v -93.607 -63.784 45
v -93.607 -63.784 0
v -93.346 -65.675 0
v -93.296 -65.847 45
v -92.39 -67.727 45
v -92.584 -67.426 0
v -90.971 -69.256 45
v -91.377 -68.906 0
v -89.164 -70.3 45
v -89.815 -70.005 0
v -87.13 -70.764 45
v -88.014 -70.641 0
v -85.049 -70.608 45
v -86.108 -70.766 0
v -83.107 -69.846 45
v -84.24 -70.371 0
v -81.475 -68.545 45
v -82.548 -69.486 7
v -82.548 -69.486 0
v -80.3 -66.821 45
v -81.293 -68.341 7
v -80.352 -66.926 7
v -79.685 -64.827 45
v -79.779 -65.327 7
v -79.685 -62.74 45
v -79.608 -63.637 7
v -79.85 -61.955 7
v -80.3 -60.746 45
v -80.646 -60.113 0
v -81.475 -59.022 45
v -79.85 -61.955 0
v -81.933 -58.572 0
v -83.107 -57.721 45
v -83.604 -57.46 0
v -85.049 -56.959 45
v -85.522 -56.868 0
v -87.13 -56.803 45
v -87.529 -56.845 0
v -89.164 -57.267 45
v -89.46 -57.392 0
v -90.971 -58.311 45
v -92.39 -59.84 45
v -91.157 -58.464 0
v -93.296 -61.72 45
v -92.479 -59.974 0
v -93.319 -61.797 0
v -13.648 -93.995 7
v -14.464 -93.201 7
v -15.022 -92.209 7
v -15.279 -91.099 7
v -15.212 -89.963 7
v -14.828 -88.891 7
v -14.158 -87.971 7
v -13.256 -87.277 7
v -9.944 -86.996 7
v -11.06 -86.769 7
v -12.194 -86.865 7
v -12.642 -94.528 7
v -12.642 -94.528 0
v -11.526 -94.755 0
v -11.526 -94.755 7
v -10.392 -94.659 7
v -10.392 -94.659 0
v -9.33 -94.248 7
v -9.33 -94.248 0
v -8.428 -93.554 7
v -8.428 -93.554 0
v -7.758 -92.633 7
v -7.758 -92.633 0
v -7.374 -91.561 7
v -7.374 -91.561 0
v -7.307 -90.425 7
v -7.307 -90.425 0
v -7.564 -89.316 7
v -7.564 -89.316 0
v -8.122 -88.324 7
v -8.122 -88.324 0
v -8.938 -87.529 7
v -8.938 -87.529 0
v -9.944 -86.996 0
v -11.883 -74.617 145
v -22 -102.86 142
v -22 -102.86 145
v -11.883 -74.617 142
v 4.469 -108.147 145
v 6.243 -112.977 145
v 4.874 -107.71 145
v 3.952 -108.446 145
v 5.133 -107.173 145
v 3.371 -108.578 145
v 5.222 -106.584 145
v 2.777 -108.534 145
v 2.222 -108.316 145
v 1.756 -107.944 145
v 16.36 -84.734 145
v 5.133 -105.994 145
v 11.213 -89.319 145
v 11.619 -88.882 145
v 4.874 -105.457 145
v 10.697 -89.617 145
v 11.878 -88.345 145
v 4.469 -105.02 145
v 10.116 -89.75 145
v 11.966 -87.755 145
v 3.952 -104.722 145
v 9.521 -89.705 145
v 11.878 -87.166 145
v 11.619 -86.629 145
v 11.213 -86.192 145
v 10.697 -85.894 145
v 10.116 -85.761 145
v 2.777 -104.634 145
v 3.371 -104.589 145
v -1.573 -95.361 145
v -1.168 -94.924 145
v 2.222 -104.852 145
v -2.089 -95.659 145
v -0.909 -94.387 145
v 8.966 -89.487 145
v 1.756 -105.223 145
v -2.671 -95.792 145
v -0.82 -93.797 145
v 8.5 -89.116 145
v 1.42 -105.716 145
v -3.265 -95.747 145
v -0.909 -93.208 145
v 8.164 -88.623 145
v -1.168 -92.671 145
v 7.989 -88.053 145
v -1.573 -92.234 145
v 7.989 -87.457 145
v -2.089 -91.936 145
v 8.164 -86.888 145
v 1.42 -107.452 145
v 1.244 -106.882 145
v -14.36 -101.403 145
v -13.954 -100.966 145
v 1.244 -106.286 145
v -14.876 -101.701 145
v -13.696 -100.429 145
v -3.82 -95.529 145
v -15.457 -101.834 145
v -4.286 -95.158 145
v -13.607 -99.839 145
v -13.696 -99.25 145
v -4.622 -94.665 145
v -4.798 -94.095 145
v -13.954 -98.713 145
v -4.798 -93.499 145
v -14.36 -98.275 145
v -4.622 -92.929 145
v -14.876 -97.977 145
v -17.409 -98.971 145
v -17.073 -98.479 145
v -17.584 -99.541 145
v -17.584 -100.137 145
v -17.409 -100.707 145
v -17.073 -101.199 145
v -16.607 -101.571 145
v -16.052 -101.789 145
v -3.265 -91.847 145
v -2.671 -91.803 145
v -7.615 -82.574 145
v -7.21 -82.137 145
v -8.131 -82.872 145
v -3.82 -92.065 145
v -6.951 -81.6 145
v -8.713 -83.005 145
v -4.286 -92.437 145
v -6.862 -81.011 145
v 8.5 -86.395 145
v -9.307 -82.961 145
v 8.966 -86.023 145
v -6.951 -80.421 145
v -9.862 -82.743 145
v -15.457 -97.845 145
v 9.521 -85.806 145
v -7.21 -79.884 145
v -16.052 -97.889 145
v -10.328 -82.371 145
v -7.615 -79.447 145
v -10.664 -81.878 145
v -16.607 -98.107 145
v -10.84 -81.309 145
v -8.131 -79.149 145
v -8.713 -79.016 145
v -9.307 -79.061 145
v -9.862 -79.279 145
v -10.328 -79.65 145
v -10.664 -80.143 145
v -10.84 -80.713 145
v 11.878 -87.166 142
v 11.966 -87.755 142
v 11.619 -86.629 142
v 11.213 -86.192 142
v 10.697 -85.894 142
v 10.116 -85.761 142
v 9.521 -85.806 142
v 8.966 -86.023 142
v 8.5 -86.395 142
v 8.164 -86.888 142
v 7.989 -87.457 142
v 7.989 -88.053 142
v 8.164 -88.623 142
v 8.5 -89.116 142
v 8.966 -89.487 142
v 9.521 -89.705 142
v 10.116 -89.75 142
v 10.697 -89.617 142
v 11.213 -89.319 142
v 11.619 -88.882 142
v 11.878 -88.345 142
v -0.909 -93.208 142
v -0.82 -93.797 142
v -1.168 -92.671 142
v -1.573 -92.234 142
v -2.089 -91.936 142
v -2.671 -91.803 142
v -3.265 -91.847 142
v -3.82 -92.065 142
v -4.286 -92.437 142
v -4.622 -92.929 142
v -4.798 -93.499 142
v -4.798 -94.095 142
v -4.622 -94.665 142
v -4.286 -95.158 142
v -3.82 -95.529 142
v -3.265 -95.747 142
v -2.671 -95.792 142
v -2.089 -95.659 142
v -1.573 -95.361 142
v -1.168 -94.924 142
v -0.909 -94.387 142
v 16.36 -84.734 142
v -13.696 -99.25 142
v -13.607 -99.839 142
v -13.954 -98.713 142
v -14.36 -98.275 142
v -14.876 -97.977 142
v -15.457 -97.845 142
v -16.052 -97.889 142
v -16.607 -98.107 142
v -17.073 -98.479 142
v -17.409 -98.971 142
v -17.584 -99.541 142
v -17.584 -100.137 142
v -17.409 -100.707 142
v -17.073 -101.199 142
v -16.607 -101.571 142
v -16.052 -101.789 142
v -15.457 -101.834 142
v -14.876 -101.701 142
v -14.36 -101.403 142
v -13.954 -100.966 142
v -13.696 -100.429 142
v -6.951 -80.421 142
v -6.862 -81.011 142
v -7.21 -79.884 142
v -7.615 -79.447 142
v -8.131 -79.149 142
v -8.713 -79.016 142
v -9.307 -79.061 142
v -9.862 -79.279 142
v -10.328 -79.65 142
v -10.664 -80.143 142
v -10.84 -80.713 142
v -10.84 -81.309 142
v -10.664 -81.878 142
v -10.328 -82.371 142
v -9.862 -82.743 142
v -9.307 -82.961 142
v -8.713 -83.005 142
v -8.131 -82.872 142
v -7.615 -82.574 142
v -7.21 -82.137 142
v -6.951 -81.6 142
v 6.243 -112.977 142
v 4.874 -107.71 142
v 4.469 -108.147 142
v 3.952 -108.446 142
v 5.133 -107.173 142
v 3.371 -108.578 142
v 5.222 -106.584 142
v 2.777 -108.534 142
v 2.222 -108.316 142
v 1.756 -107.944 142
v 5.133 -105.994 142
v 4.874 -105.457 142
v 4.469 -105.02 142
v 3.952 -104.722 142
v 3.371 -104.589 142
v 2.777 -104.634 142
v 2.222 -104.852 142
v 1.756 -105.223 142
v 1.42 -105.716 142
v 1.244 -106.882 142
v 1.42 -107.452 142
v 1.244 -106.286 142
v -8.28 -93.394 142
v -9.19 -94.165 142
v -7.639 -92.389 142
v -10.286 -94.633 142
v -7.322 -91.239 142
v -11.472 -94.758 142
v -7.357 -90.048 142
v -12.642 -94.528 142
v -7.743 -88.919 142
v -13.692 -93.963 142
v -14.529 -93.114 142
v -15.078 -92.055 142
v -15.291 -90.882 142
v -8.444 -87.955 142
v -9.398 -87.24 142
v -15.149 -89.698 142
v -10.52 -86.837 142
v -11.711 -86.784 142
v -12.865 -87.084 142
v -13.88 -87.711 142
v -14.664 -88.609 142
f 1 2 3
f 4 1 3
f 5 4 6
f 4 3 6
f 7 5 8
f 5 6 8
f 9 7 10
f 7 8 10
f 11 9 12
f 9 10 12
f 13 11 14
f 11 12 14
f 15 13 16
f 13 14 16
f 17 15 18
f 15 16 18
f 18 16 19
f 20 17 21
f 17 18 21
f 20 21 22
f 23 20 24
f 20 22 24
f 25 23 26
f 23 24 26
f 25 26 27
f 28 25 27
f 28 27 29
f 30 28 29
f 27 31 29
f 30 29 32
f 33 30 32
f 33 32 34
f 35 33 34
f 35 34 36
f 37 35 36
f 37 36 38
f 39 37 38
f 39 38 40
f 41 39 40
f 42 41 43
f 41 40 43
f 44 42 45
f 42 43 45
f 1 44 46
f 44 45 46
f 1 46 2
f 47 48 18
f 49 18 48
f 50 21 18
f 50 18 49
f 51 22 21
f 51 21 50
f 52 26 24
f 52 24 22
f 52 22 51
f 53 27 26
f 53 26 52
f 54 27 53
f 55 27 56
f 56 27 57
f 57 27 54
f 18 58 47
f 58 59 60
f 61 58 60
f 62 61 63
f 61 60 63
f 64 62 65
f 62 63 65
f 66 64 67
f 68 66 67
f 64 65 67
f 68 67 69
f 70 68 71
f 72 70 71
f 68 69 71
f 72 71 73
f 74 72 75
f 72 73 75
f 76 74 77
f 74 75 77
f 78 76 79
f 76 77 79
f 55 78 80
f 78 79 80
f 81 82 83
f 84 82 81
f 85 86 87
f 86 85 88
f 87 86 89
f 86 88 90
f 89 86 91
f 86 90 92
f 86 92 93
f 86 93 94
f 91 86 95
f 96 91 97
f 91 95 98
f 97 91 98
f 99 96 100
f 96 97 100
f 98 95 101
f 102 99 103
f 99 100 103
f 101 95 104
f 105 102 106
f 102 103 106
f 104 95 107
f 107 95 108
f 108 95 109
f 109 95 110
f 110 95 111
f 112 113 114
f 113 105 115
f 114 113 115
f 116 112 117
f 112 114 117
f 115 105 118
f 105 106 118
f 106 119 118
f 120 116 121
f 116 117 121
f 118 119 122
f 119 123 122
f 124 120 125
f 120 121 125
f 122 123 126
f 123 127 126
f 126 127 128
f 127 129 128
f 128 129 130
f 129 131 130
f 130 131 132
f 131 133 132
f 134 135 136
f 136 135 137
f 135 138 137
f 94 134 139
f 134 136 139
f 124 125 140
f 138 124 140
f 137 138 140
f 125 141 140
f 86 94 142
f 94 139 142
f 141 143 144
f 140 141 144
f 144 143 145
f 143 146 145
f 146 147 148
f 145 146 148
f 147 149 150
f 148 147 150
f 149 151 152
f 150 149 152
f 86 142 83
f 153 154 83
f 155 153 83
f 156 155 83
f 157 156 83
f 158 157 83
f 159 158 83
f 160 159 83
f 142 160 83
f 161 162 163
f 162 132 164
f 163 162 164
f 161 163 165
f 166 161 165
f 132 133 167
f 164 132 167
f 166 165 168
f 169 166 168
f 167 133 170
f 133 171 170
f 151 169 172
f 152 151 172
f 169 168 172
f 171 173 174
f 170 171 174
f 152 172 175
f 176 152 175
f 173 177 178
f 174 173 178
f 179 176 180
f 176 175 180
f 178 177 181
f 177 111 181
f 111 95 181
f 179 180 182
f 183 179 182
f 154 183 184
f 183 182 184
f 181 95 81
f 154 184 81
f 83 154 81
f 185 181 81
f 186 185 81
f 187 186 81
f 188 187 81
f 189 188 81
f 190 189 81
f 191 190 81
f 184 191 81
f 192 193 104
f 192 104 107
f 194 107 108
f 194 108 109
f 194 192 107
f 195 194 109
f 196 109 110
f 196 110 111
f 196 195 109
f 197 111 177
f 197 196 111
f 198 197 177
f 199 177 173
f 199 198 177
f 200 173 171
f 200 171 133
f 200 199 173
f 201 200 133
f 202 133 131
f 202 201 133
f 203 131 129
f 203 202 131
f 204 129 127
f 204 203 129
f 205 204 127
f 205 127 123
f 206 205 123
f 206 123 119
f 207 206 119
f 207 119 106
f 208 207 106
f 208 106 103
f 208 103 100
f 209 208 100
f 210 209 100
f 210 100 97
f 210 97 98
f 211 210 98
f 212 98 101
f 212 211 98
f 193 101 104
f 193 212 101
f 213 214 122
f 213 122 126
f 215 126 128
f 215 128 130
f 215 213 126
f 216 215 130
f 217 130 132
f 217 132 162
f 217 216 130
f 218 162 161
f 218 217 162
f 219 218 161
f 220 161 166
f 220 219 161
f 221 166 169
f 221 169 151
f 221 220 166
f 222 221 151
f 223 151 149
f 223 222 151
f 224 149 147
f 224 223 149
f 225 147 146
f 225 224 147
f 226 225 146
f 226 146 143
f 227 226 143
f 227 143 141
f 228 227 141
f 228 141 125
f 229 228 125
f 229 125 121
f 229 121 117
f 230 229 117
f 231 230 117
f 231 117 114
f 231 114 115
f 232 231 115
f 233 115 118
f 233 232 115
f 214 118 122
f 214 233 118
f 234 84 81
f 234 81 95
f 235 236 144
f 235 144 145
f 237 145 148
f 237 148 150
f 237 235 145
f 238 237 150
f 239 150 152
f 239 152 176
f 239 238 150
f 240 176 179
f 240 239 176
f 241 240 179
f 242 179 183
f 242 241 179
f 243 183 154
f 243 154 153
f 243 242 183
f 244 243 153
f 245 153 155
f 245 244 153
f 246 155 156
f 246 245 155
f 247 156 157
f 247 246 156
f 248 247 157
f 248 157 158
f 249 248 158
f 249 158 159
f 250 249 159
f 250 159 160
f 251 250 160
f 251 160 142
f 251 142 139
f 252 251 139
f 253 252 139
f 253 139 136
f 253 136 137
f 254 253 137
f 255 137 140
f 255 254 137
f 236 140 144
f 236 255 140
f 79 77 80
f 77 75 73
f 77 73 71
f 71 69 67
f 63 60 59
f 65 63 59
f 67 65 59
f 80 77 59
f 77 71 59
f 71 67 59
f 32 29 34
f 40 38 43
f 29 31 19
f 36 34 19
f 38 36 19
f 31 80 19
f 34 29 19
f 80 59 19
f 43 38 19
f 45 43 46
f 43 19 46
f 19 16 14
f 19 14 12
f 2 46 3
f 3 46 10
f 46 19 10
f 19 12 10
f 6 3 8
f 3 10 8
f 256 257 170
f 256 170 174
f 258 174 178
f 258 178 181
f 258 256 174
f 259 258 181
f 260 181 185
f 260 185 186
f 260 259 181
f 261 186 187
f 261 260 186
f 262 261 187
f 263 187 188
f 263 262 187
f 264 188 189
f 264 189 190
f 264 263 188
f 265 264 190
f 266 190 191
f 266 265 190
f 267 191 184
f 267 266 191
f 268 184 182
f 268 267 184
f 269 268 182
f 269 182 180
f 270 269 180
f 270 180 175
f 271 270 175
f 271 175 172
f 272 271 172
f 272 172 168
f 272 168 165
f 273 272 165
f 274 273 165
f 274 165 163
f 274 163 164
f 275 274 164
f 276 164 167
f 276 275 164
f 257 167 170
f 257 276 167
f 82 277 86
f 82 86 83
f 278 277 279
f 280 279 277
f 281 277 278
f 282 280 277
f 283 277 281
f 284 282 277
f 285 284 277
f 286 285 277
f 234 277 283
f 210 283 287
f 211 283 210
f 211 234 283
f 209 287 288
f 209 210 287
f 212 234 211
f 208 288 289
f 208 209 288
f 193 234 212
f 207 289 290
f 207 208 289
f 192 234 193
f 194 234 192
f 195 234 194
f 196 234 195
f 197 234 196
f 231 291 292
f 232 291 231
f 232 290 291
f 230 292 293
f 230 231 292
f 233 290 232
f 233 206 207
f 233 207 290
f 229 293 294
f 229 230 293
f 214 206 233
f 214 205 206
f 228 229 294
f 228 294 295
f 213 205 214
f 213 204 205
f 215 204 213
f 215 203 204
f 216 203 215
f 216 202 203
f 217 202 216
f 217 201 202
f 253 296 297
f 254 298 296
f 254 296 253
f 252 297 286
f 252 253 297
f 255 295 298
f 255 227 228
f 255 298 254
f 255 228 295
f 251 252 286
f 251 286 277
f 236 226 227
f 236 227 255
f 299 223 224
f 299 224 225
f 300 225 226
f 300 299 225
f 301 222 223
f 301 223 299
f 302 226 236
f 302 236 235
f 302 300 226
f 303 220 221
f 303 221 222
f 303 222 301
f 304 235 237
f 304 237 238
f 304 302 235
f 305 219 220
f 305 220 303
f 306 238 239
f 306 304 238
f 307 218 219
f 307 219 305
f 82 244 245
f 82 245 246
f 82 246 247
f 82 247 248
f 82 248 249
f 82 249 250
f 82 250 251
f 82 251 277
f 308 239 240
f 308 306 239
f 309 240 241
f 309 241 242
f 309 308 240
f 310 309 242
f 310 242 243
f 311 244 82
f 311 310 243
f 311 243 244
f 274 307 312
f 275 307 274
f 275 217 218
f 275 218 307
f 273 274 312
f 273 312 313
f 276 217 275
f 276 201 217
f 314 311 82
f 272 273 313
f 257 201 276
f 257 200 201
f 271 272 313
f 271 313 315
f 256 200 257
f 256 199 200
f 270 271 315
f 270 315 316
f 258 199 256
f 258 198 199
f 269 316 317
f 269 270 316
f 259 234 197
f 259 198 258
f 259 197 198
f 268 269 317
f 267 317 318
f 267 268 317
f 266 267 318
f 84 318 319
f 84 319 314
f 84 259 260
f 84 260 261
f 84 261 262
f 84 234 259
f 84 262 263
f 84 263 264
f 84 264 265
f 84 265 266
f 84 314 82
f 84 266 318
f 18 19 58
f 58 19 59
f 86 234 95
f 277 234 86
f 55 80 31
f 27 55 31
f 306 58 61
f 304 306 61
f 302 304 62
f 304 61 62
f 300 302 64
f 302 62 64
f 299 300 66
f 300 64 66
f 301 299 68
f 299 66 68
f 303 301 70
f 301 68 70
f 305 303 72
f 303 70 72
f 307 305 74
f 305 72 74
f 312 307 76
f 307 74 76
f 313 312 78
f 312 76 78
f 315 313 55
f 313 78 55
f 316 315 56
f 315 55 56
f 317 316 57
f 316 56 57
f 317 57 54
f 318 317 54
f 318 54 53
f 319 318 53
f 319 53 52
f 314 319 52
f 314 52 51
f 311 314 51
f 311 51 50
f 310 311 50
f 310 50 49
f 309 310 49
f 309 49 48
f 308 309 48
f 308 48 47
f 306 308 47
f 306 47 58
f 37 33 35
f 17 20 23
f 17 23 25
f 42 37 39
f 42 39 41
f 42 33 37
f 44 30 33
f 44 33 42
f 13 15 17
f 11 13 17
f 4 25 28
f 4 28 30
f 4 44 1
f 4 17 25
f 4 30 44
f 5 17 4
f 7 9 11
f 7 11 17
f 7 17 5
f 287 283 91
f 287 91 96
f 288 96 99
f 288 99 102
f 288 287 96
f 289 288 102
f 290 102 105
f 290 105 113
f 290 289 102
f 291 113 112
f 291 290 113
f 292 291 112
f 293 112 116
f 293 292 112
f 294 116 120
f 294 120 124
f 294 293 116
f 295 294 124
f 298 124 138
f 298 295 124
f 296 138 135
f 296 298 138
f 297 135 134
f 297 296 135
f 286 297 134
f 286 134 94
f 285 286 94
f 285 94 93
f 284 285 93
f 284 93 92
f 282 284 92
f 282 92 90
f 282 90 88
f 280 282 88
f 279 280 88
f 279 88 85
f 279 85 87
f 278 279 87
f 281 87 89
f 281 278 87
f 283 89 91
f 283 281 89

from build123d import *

# Parameters (mm, degrees)
SKETCH_1_R      = 7
EXTRUDE_1_DEPTH = 45
EXTRUDE_2_DEPTH = 7
SKETCH_7_R      = 4
EXTRUDE_3_DEPTH = 135
SKETCH_8_R      = 2
EXTRUDE_4_DEPTH = 3


with BuildPart() as part:
    # 草图1 → 凸台-拉伸1 (new body)
    with BuildSketch(Plane.XY):
        with Locations(Location((-86.606649797, -63.783530386, 0), (0, 0, 180))):
            Circle(SKETCH_1_R)
    extrude(amount=EXTRUDE_1_DEPTH)

    # 草图3 → 凸台-拉伸2 (add)
    with BuildSketch(Plane(origin=(0, 0, 0), x_dir=(-1, 0, 0), z_dir=(0, 0, -1))):
        with BuildLine():
            Line((87.955581339, -67.549215409), (12.641880873, -94.52784625))
            ThreePointArc((12.641880873, -94.52784625), (7.527264308, -92.111092769), (9.944017789, -86.996476204))
            Line((9.944017789, -86.996476204), (85.257718255, -60.017845362))
            ThreePointArc((85.257718255, -60.017845362), (90.37233482, -62.434598843), (87.955581339, -67.549215409))
        make_face()
    extrude(amount=-EXTRUDE_2_DEPTH)

    # 草图7 → 凸台-拉伸3 (add)
    with BuildSketch(Plane.XY.offset(7)):
        with Locations(Location((-11.292949331, -90.762161227, 0), (0, 0, 250.291624105))):
            Circle(SKETCH_7_R)
    extrude(amount=EXTRUDE_3_DEPTH)

    # 草图8 → 凸台-拉伸4 (add)
    with BuildSketch(Plane.XY.offset(142)):
        Polygon((-11.882983583, -74.617445076), (16.359654092, -84.734431642), (6.242667526, -112.977069317), (-21.999970149, -102.860082751), align=None)
        with Locations((-8.862041731, -81.010715783)):
            Circle(SKETCH_8_R, mode=Mode.SUBTRACT)
        with Locations((9.966383385, -87.755373494)):
            Circle(SKETCH_8_R, mode=Mode.SUBTRACT)
        with Locations((-15.606699442, -99.8391409)):
            Circle(SKETCH_8_R, mode=Mode.SUBTRACT)
        with Locations((3.221725675, -106.58379861)):
            Circle(SKETCH_8_R, mode=Mode.SUBTRACT)
        with Locations((-2.820158028, -93.797257197)):
            Circle(SKETCH_8_R, mode=Mode.SUBTRACT)
    extrude(amount=EXTRUDE_4_DEPTH)


solid = part.part
